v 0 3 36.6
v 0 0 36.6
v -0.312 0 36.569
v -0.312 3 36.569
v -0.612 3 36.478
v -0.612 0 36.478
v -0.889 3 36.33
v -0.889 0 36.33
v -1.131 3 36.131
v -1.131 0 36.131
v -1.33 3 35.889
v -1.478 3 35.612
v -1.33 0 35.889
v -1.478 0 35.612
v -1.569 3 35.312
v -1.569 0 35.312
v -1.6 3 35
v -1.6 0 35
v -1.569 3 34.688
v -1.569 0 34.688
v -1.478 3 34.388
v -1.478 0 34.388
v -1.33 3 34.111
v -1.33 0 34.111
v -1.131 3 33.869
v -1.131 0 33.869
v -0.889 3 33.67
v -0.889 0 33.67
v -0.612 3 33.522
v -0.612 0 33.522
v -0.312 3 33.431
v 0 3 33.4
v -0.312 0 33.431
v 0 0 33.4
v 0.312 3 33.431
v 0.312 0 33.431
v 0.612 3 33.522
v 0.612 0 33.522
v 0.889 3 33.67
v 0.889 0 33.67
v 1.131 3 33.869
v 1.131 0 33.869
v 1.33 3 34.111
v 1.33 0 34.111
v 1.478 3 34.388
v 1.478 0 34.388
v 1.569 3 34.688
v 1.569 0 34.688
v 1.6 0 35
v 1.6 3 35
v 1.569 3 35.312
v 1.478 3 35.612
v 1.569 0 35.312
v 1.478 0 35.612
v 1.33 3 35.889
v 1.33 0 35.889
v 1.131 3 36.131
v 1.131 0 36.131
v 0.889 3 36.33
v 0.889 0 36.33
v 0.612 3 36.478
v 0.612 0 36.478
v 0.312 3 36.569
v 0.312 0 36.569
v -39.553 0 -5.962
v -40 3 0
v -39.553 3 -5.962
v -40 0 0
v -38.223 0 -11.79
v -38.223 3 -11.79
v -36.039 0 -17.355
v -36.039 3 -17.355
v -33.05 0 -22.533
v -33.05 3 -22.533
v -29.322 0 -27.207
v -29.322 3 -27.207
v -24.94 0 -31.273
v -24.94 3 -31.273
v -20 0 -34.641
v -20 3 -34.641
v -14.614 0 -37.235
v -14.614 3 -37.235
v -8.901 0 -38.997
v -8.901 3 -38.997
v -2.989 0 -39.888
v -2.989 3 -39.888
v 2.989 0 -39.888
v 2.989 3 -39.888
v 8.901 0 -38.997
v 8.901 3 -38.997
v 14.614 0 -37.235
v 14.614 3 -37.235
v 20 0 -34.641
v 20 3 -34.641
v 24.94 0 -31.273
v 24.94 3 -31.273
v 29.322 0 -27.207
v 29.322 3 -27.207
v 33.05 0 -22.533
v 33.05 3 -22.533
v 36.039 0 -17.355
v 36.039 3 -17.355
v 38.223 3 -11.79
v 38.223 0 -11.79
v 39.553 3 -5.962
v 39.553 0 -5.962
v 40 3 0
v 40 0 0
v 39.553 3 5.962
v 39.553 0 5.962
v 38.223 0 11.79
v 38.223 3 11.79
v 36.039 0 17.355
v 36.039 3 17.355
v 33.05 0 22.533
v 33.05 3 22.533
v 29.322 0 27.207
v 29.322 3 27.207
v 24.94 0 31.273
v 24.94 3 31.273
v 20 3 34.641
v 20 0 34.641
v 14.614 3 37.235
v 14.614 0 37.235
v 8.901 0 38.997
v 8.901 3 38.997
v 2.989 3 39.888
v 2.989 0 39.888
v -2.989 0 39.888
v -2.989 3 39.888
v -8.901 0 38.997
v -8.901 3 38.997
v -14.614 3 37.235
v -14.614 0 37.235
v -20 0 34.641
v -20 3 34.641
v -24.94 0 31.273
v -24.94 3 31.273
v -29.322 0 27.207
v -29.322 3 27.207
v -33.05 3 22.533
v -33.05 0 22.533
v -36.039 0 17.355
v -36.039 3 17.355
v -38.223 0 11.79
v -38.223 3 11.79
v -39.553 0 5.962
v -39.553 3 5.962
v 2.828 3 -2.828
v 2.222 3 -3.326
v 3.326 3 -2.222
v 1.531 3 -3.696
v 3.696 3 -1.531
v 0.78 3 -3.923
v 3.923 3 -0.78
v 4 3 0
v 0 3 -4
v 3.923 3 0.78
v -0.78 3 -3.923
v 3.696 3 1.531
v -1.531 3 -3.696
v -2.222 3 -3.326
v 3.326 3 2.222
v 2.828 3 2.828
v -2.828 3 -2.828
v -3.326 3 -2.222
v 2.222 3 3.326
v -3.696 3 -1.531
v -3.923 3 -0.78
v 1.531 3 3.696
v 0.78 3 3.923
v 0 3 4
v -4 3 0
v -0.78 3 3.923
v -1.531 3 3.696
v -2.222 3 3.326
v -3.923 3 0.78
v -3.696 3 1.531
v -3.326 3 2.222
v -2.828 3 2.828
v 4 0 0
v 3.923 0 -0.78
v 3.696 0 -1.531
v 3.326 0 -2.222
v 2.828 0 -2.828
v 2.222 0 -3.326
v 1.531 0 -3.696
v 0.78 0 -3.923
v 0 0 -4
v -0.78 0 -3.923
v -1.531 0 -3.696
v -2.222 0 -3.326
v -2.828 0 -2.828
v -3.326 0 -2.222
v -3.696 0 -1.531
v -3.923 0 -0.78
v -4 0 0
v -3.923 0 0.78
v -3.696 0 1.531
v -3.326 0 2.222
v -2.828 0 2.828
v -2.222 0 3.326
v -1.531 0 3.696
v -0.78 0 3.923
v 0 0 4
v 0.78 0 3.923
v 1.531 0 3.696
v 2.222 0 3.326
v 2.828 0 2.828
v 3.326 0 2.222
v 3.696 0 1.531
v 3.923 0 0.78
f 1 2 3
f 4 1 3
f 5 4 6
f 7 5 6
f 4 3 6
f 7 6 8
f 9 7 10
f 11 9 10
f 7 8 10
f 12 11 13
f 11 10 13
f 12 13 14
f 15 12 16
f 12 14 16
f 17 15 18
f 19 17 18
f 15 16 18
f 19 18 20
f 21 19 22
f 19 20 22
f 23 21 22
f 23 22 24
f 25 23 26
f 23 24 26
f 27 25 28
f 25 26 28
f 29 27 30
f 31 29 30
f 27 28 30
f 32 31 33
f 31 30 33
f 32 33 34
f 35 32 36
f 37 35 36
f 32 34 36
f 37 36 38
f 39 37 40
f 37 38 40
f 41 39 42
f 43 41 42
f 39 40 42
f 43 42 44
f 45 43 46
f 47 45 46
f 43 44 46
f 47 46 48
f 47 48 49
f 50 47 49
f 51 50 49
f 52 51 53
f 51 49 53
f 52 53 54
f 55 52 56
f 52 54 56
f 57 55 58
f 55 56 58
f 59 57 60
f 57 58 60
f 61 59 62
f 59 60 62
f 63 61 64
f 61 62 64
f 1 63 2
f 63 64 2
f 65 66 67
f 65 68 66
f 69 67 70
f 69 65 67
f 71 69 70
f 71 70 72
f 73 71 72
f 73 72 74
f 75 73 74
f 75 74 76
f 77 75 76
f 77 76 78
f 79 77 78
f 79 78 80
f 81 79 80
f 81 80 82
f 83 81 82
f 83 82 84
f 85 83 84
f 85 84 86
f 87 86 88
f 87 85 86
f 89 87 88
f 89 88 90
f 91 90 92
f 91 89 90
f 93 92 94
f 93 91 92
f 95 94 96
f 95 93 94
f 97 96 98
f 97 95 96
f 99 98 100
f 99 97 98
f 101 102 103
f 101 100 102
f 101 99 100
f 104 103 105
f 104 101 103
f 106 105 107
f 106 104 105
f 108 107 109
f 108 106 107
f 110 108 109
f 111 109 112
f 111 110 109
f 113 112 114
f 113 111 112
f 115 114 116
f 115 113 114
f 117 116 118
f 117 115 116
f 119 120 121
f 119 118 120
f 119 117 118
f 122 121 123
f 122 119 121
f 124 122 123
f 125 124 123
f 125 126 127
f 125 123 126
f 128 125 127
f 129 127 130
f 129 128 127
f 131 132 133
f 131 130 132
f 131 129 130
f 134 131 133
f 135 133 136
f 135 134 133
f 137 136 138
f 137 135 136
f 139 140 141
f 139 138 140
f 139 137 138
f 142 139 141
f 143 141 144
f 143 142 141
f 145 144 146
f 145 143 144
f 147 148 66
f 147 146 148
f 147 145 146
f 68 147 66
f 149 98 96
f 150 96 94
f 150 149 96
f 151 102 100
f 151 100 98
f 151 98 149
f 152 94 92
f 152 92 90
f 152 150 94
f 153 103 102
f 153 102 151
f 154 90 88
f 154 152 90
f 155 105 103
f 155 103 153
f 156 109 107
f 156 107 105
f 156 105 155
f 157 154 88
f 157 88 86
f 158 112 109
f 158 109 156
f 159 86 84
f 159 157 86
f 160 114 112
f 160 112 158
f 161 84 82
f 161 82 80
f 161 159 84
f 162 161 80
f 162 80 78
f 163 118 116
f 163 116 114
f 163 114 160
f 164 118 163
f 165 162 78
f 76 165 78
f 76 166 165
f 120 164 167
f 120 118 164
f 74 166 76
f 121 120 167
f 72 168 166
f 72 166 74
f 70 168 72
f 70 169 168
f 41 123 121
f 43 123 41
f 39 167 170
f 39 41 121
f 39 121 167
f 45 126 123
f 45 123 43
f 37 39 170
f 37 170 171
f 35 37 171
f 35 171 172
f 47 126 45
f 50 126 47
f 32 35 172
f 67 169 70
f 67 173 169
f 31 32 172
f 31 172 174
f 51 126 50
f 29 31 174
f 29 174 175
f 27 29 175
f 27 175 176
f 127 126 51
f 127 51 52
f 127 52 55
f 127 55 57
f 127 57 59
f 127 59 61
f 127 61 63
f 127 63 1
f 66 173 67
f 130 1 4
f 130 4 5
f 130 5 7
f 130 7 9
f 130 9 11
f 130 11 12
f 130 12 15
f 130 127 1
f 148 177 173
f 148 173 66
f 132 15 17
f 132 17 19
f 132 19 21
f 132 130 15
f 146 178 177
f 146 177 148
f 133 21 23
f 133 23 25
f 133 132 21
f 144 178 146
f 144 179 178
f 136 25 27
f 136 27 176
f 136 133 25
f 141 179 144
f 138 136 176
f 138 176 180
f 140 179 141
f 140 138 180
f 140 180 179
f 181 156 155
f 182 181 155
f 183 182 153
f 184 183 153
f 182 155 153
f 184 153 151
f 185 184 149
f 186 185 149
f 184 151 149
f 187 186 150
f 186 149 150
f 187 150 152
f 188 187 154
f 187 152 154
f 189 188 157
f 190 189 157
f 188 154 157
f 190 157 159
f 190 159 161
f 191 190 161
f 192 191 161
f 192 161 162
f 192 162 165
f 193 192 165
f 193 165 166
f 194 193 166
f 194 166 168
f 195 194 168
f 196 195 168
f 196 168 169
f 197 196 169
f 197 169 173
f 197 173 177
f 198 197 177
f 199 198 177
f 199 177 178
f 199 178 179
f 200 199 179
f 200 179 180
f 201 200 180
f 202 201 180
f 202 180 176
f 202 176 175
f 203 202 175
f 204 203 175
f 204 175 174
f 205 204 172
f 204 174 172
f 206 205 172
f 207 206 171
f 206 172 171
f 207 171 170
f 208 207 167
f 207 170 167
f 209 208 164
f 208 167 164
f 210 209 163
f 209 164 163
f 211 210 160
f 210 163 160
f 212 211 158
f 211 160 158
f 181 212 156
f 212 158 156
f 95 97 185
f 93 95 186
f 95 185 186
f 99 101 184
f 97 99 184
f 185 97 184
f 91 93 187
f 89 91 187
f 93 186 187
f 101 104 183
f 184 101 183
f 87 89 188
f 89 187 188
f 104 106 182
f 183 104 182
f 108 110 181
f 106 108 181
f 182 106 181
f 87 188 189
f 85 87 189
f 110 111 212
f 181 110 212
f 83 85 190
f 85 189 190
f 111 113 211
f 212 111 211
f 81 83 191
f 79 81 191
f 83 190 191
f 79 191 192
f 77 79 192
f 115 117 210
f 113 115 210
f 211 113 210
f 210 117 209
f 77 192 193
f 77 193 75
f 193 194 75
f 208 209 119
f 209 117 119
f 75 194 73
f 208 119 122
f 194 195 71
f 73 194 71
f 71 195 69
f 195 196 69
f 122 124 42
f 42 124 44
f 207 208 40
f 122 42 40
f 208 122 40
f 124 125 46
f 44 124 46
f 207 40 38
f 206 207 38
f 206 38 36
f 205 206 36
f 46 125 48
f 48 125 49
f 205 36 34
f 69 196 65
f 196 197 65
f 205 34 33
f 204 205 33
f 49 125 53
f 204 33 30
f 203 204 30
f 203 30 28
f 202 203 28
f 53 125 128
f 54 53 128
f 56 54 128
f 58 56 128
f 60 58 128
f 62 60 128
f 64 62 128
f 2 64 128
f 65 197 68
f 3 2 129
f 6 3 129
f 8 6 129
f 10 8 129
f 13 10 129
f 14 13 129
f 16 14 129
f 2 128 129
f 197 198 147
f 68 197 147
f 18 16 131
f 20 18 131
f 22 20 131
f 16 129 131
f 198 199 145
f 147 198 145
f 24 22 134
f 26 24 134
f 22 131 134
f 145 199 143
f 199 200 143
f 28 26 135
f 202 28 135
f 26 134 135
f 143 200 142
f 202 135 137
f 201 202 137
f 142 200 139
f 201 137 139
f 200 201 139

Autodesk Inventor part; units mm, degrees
ref_plane "YZ Plane" through (0, 0, 0) normal (1, 0, 0) x (0, 1, 0)
ref_plane "XZ Plane" through (0, 0, 0) normal (0, 1, 0) x (-1, 0, 0)
ref_plane "XY Plane" through (0, 0, 0) normal (0, 0, 1) x (1, 0, 0)
sketch "スケッチ1" plane through (0, 0, 0) normal (0, 1, 0) x (-1, 0, 0)
  circle A0 centre (0, 0) radius 40
  dimension "d0" = 80
extrude "押し出し1" add sketch "スケッチ1" along normal blind 3
sketch "スケッチ2" plane through (0, 3, 0) normal (0, 1, 0) x (1, 0, 0)
  circle A0 centre (0, 0) radius 4
  dimension "d3" = 8
extrude "押し出し2" cut sketch "スケッチ2" against normal blind 3
sketch "スケッチ3" plane through (0, 3, 0) normal (0, 1, 0) x (1, 0, 0)
  circle A0 centre (0, -35) radius 1.6
  circle A1 centre (0, 0) radius 40 projected
  dimension "d6" = 3.2
  dimension "d7" = 35
hole "穴1" at (0, 3, 35) direction (0, -1, 0) diameter 3.2 end through all
properties part number "NHK_t0_2"
